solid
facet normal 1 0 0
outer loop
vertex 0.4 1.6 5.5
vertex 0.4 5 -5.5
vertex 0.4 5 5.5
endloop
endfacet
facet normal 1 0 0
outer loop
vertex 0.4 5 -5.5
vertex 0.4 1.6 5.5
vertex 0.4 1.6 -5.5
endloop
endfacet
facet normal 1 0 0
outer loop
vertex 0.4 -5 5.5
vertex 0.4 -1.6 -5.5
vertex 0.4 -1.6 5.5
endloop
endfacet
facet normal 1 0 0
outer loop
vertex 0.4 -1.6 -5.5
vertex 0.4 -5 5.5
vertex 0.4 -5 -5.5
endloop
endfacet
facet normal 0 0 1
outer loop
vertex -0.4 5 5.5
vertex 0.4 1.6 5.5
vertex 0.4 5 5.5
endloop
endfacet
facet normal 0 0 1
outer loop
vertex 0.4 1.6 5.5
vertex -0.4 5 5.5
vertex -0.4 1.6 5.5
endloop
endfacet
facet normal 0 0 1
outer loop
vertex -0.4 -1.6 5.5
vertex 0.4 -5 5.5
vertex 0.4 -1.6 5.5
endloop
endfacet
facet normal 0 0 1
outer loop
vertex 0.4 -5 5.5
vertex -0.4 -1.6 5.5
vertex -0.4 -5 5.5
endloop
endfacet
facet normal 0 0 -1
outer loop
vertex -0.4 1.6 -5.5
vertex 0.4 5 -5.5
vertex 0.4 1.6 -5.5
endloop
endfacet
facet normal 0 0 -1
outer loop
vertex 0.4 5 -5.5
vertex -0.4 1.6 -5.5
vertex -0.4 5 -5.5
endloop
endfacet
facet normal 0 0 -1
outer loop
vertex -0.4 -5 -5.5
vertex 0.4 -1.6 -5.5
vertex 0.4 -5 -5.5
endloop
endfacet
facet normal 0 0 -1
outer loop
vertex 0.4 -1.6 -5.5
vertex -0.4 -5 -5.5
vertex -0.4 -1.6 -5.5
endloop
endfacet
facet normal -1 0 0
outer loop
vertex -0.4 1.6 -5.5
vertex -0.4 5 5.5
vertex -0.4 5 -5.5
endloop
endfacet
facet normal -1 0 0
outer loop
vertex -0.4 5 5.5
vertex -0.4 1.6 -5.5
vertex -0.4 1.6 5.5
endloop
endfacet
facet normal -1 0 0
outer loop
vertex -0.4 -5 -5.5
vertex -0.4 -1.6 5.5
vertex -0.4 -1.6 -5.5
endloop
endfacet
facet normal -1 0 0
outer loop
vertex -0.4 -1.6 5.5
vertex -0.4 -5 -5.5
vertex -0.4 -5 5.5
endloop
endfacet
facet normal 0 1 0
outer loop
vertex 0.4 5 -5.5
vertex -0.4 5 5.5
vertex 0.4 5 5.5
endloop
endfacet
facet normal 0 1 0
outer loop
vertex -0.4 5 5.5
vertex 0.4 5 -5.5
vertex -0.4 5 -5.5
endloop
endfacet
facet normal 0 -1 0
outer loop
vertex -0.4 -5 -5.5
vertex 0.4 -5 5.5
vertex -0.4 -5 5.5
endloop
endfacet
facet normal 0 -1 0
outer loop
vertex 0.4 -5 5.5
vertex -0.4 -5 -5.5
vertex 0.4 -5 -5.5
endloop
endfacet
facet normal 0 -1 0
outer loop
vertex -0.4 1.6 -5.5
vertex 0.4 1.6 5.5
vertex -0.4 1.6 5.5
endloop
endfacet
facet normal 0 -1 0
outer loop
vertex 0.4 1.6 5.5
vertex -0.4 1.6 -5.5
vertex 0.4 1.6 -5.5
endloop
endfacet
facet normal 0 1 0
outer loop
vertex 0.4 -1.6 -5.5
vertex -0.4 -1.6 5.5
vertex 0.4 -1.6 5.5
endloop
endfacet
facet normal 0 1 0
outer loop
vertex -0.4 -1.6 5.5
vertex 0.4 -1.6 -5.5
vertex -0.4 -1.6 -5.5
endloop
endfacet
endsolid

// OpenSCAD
// Parameters
clip_type = 0; //[0:1:1]
open = 0.9; //[0.2:1.2:0.05]
include_spigot_hole = 1; //[0:1:1]
hole_depth_h = 0; //[0:30:1]
overlap = 1; //[0.5:2:0.1]
t = 0.8; //[0.4:1.6:0.05]
length = 45; //[25:90:1]
width = 18; //[10:36:1]
height = 16; //[8:32:1]
hinge_offset = 14; //[7:28:1]
arm_l = 16; //[8:32:1]
arm_w = 4; //[2:8:0.5]
hook_x = 10; //[5:20:1]
hook_y = 10; //[5:20:1]
spigot_x = 8; //[4:16:1]
spigot_y = 8; //[4:16:1]
spigot_z = 10; //[5:20:1]
or = 2.5; //[1.5:5:0.1]
arm_angle_deg = 35; //[5:70:1]
spigot_angle_deg = 25; //[5:60:1]
w_narrow = 10; //[6:20:1]
gusset_thickness = 0.8; //[0.4:1.6:0.05]
gusset_len = 6; //[3:12:0.5]
hole_clearance = 0.2; //[0.1:0.6:0.05]

// small guaranteed connection overlap (1-2mm)
conn = 1.2;

// --- Shared layout (single source of truth for all positions) ---
module clip_layout() {
  // Place hook stem at x=0, then build everything from that.
  x_stem = 0;

  // Hook stem (vertical)
  x_hook = x_stem + (t/2 + hook_x/2 - conn);

  // Main body (the previously floating left rectangular block)
  body_len = max(hinge_offset - spigot_x, t);
  x_body = (x_hook + hook_x/2) + (body_len/2 - conn);

  // Spigot base + stem
  sp_base_len = max(spigot_x - or, t);
  x_sp_base = (x_body + body_len/2) + (sp_base_len/2 - conn);
  x_sp_stem = (x_sp_base + sp_base_len/2) + (t/2 - conn);

  // Arm anchor (inside body by conn so rotation still intersects)
  x_arm_anchor = x_body + body_len/2 - conn;

  // Provide all computed values to children
  children(
    x_stem,
    x_hook,
    body_len,
    x_body,
    sp_base_len,
    x_sp_base,
    x_sp_stem,
    x_arm_anchor
  );
}

// Swiss Clip - complete geometry (fixed connectivity)
module swiss_clip() {
  color([0.15, 0.2, 0.35])
  union() {
    clip_layout() {
      x_stem      = $children[0];
      x_hook      = $children[1];
      body_len    = $children[2];
      x_body      = $children[3];
      sp_base_len = $children[4];
      x_sp_base   = $children[5];
      x_sp_stem   = $children[6];
      x_arm_anchor= $children[7];

      // Hook stem (vertical)
      translate([x_stem, 0, (height - 2*or)/2])
        cube([t, hook_y, height - 2*or], center=true);

      // Hook section (bottom pad) - overlaps stem by conn
      translate([x_hook, 0, 0])
        cube([hook_x, hook_y, t], center=true);

      // Hook top - overlaps stem by conn
      hook_top_len = hook_x - or;
      x_hook_top = x_stem + (t/2 + hook_top_len/2 - conn);
      translate([x_hook_top, 0, height - t/2])
        cube([hook_top_len, hook_y, t], center=true);

      // Main clip body block (ensure overlap with hook pad)
      translate([x_body, 0, 0])
        cube([body_len, width, t], center=true);

      // Hinge spigot base - attached to body with overlap
      translate([x_sp_base, 0, 0])
        cube([sp_base_len, spigot_y, t], center=true);

      // Hinge spigot stem - attached to spigot base with overlap
      translate([x_sp_stem, 0, or + (spigot_z - or)/2 - conn])
        cube([t, spigot_y, spigot_z - or], center=true);

      // --- Arms (ensure they intersect the body) ---
      arm_z = t/2;

      rotate([0, -arm_angle_deg*open, 0])
        translate([x_arm_anchor + arm_l/2, -(w_narrow/2 + arm_w/2), arm_z])
          cube([arm_l, arm_w, t], center=true);

      rotate([0, -arm_angle_deg*open, 0])
        translate([x_arm_anchor + arm_l/2,  (w_narrow/2 + arm_w/2), arm_z])
          cube([arm_l, arm_w, t], center=true);

      // --- Gussets (ensure they intersect the body/arms) ---
      x_gus_anchor = x_body + body_len/2 - conn; // inside body by conn

      rotate([0, -(spigot_angle_deg*open), 0])
        translate([x_gus_anchor + gusset_len/2, 0, t/2])
          cube([gusset_len, w_narrow, gusset_thickness], center=true);

      rotate([0, -(spigot_angle_deg*open), 0])
        translate([x_gus_anchor + gusset_len/2, -(w_narrow/2 + arm_w/2), t/2])
          cube([gusset_len, arm_w, gusset_thickness], center=true);

      rotate([0, -(spigot_angle_deg*open), 0])
        translate([x_gus_anchor + gusset_len/2,  (w_narrow/2 + arm_w/2), t/2])
          cube([gusset_len, arm_w, gusset_thickness], center=true);

      // --- Fix floating thin diagonal lever/bar + inner thin bar near circular area ---
      // Create two bars that are GUARANTEED to intersect the spigot stem and the body.
      // Use hull() between two small "pads" so the bar always touches both endpoints.
      bar_w = 1.6;
      bar_h = t;

      // Endpoint pads (overlap into solids by conn)
      // Pad A: inside body near right face
      xA = x_body + body_len/2 - conn;
      zA = t/2;

      // Pad B: inside spigot stem volume
      xB = x_sp_stem;
      zB = or + (spigot_z - or)/2 - conn;

      // Diagonal lever (upper) - touches body and spigot stem
      y_diag = 0;
      hull() {
        translate([xA, y_diag, zA])
          cube([bar_w, bar_w, bar_h], center=true);
        translate([xB, y_diag, zB])
          cube([bar_w, bar_w, bar_h], center=true);
      }

      // Inner thin bar (lower/inner) - also touches body and spigot stem
      // Slightly offset in Y/Z so it is distinct but still connected.
      y_inner = -spigot_y*0.18;
      z_innerA = t/2;
      z_innerB = zB - 1.0; // keep within stem; still overlaps due to hull pads
      hull() {
        translate([xA, y_inner, z_innerA])
          cube([bar_w, bar_w, bar_h], center=true);
        translate([xB, y_inner, z_innerB])
          cube([bar_w, bar_w, bar_h], center=true);
      }

      // --- Fix floating small rectangular piece on left side (top/bottom views) ---
      // Add a small cap/strap that overlaps the hook stem and hook top.
      // This keeps the design but guarantees it is physically attached.
      cap_len = max(hook_x*0.7, 6);
      cap_w   = hook_y;
      cap_h   = t;

      // Place it near the top of the hook, overlapping the stem by conn.
      x_cap = x_stem + (t/2 + cap_len/2 - conn);
      translate([x_cap, 0, height - t/2])
        cube([cap_len, cap_w, cap_h], center=true);

      // --- Add connecting braces (previously could appear separated in top/bottom views) ---
      // Ensure braces overlap into BOTH body and spigot base by using hull pads.
      brace_w = 1.6;
      brace_h = t;

      // Transition region between body and spigot base
      xC = x_body + body_len/2 - conn;          // inside body
      xD = x_sp_base - sp_base_len/2 + conn;    // inside spigot base
      y_off = width*0.18;
      z_br = t/2;

      // Upper brace
      hull() {
        translate([xC,  y_off, z_br]) cube([brace_w, brace_w, brace_h], center=true);
        translate([xD,  y_off, z_br]) cube([brace_w, brace_w, brace_h], center=true);
      }

      // Lower brace
      hull() {
        translate([xC, -y_off, z_br]) cube([brace_w, brace_w, brace_h], center=true);
        translate([xD, -y_off, z_br]) cube([brace_w, brace_w, brace_h], center=true);
      }
    }
  }
}

// Swiss Clip Hole - subtractive geometry ONLY (do not union as a solid)
module swiss_clip_hole() {
  if (include_spigot_hole) {
    clip_layout() {
      x_sp_stem = $children[6];

      translate([x_sp_stem, 0, or + (spigot_z - or)/2 - conn])
        rotate([90, 0, 0])
          cylinder(
            r = sqrt((spigot_y*spigot_y + (spigot_z*spigot_z))/4) + hole_clearance,
            h = max(hole_depth_h, t*4),
            center = true
          );
    }
  }
}

// Assembly: single connected solid, with optional hole as a difference
module assembly() {
  if (include_spigot_hole)
    difference() {
      swiss_clip();
      swiss_clip_hole();
    }
  else
    swiss_clip();
}

assembly();
